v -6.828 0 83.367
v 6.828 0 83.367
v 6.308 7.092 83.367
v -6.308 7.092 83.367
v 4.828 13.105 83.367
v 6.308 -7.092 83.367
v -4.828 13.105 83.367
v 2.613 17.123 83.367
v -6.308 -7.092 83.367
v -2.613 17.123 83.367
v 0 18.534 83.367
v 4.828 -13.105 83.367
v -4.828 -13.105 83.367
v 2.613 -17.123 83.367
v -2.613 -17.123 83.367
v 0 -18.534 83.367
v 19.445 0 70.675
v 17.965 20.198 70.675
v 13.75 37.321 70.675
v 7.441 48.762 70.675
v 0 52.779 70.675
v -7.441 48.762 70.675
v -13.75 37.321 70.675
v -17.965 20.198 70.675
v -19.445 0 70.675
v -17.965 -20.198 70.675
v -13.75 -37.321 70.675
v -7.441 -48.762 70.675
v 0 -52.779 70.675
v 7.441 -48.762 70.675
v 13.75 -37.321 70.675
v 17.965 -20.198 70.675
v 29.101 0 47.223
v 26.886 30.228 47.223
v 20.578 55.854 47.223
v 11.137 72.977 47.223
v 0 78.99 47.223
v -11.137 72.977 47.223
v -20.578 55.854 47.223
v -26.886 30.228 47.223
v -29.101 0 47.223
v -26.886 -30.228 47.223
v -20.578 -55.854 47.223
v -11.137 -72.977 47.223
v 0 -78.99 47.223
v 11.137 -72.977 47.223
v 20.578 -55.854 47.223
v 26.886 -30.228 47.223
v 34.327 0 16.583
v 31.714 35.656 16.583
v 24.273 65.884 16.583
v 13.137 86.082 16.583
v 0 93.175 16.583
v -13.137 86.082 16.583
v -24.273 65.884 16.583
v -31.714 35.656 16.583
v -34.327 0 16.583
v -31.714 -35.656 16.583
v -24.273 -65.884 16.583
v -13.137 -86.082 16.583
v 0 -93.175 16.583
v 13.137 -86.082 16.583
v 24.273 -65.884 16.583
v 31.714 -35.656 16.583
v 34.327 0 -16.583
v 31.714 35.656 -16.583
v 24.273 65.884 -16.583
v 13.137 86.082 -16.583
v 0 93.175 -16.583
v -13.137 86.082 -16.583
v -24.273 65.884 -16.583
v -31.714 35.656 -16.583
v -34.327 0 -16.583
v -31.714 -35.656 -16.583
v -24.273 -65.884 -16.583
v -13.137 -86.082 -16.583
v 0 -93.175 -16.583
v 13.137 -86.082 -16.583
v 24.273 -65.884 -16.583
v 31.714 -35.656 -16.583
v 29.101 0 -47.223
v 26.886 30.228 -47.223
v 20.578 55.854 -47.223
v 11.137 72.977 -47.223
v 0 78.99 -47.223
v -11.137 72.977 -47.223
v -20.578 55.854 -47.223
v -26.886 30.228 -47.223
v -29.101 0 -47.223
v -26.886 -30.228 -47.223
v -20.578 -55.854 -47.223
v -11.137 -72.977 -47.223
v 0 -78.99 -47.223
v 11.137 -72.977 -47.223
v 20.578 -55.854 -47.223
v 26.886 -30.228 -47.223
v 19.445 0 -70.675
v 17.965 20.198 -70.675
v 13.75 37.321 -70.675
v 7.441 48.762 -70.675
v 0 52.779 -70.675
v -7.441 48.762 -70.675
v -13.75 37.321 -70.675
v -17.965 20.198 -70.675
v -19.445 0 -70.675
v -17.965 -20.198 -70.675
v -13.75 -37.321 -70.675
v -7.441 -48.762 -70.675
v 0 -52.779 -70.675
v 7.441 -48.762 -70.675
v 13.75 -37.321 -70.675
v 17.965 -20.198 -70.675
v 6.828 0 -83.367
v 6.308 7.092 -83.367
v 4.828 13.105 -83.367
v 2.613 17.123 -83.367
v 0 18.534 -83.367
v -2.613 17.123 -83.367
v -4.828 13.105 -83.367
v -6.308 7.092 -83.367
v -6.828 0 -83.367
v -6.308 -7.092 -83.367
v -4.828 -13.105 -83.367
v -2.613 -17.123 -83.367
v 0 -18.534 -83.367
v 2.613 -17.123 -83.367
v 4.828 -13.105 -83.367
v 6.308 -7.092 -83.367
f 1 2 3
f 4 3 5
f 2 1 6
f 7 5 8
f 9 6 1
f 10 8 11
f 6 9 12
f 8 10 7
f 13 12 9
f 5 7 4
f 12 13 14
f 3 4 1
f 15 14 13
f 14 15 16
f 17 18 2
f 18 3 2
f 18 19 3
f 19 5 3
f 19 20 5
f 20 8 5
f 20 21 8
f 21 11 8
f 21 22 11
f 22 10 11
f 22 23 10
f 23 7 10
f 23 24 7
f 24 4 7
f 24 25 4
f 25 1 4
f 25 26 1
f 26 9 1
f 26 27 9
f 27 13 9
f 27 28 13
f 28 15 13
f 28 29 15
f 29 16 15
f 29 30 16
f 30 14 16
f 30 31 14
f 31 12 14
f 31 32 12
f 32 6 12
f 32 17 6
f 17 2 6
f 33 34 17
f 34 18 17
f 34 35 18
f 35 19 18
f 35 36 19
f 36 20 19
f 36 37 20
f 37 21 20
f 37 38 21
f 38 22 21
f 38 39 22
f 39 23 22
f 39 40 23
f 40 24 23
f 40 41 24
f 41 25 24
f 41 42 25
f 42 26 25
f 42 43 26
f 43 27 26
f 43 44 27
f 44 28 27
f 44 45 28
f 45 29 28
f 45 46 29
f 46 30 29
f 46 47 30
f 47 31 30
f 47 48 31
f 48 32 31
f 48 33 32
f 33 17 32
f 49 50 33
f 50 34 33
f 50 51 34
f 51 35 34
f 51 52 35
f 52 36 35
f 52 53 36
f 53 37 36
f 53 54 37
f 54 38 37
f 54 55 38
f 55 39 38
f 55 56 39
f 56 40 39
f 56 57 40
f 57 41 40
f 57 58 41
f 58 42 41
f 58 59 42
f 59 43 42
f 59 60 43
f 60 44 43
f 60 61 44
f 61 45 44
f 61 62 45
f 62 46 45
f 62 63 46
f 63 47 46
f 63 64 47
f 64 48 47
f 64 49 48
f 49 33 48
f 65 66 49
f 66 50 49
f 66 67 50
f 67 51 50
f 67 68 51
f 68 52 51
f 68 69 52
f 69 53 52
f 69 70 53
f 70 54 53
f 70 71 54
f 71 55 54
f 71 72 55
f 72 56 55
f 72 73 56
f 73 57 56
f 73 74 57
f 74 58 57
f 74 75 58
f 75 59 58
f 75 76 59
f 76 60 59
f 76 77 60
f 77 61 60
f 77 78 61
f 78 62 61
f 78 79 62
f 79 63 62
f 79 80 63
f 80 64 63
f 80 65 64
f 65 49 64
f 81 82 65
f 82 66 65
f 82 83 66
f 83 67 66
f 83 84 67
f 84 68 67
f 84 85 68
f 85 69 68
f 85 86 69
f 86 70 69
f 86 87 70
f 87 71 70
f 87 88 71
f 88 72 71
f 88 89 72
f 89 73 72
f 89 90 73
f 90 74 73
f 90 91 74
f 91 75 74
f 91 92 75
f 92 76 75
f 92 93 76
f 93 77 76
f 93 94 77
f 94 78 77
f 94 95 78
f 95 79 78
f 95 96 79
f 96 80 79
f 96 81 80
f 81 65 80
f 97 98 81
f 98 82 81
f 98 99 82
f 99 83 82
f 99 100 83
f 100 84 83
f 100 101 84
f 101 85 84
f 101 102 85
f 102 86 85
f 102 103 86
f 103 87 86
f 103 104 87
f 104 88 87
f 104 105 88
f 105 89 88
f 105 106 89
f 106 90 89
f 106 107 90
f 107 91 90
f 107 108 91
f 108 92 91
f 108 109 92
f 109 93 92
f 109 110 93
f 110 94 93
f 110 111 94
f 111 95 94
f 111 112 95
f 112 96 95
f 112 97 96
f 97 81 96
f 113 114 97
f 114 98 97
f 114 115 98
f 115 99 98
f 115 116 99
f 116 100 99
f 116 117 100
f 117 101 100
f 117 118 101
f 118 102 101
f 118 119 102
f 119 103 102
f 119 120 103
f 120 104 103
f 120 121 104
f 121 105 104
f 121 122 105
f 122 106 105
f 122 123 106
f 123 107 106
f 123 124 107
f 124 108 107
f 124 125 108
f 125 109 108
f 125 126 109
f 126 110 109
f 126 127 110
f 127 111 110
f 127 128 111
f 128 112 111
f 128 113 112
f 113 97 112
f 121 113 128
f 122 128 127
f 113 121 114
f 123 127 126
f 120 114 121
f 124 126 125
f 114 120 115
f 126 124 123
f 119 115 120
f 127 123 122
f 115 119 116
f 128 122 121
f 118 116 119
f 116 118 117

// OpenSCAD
// Generated by SolidPython 1.0.1 on 2020-07-29 00:46:48


scale(v = [7, 19, 17]) {
	sphere(r = 5);
}
/***********************************************
*********      SolidPython code:      **********
************************************************
 
# import packages: SolidPython
from solid import *
from solid.utils import *
from itertools import chain, combinations, permutations


class Resize:

    def __init__(self, scad_file):
        self.scad_file = scad_file
        #self.scad_file = import_scad(scad_file)
        # cone/cylinder param:
        self.r1 = 0
        self.r2 = 0
        self.h = 0
        # rectangular prism param:
        self.w = 0
        self.l = 0
        # ellipse param:
        self.r = 0

    # import OpenScad code (file name corresponds to shape)


    # classify shape + parameters
    def assign(self, param1, param2, param3):
        if self.scad_file == 'cone.scad':
            self.r1 = param1
            self.r2 = param2
            self.h = param3
        elif self.scad_file == 'cylinder.scad':
            self.r1 = param1
            self.r2 = param2
            self.h = param3
        elif self.scad_file == 'rectangularPrism.scad':
            self.h = param1
            self.l = param2
            self.w = param3
        else:
            self.r = param1
            self.h = param2

    # resize parameters
    def iterate(self):
        x = range(3, 20, 2)
        i = 1
        if self.scad_file == 'cone.scad':
            tempList = list(permutations(x, 2))
            for temp in tempList:
                param1 = temp[0]
                param2 = temp[1]
                filepath = 'produced_scad_files/' + 'cone' + str(param1) + '_' + str(param2) + '_' + '.scad'
                scad_render_to_file(cylinder(h=param1, r1=param2, r2=0), filepath)

        elif self.scad_file == 'cylinder.scad':
            tempList = list(permutations(x, 3))
            for temp in tempList:
                param1 = temp[0]
                param2 = temp[1]
                filepath = 'produced_scad_files/' + 'cylinder' + str(param1) + '_' + str(param2) + '_' + '.scad'
                scad_render_to_file(cylinder(h=param1, r1=param2, r2=param2), filepath)

        elif self.scad_file == 'rectangularPrism.scad':
            tempList = list(permutations(x, 3))
            for temp in tempList:
                param1 = temp[0]
                param2 = temp[1]
                param3 = temp[2]
                filepath = 'produced_scad_files/' + 'rectangularPrism' + str(param1) + '_' + str(param2) + '_' + str(
                    param3) + '.scad'
                scad_render_to_file(cube(size=(param1, param2, param3)), filepath)

        elif self.scad_file == 'ellipse.scad':
            tempList = list(permutations(x, 4))
            for temp in tempList:
                param1 = temp[0]
                param2 = temp[1]
                param3 = temp[2]
                param4 = temp[3]
                filepath = 'produced_scad_files/' + 'ellipse' + str(param1) + '_' + str(param2) + '_' + str(param3) + '_' + str(param4) + '.scad'
                scad_render_to_file(scale([param1, param2, param3])(sphere(r=param4)), filepath)

    def render_to_scadfile(self):
        scad_render_to_file(scad, 'example.scad') 
 
************************************************/
